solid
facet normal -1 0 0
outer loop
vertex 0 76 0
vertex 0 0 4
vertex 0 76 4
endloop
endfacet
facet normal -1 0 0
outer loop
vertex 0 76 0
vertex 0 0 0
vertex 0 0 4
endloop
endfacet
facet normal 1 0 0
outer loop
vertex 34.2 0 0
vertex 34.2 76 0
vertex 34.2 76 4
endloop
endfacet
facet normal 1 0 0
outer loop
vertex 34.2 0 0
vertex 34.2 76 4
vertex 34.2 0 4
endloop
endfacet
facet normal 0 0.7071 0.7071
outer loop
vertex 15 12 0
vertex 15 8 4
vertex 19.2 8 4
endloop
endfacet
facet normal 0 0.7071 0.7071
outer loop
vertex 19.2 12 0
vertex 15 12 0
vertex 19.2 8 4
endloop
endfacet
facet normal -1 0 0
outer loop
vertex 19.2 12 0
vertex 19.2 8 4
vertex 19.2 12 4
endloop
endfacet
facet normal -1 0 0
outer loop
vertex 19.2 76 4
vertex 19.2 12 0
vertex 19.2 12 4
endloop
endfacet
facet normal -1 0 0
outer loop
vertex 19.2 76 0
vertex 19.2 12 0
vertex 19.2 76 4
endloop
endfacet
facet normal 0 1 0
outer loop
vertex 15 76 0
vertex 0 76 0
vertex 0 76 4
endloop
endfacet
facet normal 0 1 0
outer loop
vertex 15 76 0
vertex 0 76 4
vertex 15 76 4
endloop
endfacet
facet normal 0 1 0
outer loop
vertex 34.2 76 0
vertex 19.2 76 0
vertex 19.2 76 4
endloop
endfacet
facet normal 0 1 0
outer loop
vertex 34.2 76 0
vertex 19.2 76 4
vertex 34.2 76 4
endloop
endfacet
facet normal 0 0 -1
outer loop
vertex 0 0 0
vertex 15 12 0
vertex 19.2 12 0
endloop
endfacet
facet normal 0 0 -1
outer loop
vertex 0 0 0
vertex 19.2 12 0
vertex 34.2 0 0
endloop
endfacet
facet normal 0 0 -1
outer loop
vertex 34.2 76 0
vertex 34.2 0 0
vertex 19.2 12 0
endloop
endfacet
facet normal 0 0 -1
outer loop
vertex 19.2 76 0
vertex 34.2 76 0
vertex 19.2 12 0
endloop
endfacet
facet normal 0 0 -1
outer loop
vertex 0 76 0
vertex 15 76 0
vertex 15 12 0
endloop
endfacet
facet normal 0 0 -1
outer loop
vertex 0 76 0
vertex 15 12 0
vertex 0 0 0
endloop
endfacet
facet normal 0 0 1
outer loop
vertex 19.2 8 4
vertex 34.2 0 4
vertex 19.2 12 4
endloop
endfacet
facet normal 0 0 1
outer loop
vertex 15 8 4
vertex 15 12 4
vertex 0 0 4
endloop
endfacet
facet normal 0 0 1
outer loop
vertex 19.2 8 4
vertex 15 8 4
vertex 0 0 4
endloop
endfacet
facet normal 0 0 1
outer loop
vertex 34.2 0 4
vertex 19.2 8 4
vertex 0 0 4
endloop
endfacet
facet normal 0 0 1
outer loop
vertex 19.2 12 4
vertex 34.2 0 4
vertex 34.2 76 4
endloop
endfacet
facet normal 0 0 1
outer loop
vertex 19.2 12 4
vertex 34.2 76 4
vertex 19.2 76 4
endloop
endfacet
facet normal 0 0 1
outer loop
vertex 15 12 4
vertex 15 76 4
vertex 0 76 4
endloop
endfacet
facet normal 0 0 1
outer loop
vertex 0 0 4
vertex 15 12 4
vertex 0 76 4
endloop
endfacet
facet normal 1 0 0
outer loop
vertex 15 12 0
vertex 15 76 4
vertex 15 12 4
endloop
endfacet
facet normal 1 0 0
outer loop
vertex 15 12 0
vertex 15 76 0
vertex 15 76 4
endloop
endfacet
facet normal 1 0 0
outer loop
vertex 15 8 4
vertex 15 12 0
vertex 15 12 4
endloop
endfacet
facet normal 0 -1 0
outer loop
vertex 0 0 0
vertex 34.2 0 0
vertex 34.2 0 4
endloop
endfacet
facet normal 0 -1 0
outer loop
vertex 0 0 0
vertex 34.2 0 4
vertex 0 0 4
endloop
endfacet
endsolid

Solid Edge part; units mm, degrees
sketch "Sketch1" plane through (0, 0, 0) normal (0, 0, 1) x (1, 0, 0)
  line L0 (34.2, 76) -> (34.2, 0)
  line L1 (34.2, 0) -> (0, 0)
  line L2 (0, 0) -> (0, 76)
  line L3 (0, 76) -> (15, 76)
  line L4 (15, 76) -> (15, 12)
  line L5 (15, 12) -> (19.2, 12)
  line L6 (19.2, 12) -> (19.2, 76)
  line L7 (19.2, 76) -> (34.2, 76)
extrude "Protrusion1" add sketch "Sketch1" along normal blind 4
chamfer "Chaflán_2" distance 4 angle 45 1 edges at (17.1, 12, 4)
